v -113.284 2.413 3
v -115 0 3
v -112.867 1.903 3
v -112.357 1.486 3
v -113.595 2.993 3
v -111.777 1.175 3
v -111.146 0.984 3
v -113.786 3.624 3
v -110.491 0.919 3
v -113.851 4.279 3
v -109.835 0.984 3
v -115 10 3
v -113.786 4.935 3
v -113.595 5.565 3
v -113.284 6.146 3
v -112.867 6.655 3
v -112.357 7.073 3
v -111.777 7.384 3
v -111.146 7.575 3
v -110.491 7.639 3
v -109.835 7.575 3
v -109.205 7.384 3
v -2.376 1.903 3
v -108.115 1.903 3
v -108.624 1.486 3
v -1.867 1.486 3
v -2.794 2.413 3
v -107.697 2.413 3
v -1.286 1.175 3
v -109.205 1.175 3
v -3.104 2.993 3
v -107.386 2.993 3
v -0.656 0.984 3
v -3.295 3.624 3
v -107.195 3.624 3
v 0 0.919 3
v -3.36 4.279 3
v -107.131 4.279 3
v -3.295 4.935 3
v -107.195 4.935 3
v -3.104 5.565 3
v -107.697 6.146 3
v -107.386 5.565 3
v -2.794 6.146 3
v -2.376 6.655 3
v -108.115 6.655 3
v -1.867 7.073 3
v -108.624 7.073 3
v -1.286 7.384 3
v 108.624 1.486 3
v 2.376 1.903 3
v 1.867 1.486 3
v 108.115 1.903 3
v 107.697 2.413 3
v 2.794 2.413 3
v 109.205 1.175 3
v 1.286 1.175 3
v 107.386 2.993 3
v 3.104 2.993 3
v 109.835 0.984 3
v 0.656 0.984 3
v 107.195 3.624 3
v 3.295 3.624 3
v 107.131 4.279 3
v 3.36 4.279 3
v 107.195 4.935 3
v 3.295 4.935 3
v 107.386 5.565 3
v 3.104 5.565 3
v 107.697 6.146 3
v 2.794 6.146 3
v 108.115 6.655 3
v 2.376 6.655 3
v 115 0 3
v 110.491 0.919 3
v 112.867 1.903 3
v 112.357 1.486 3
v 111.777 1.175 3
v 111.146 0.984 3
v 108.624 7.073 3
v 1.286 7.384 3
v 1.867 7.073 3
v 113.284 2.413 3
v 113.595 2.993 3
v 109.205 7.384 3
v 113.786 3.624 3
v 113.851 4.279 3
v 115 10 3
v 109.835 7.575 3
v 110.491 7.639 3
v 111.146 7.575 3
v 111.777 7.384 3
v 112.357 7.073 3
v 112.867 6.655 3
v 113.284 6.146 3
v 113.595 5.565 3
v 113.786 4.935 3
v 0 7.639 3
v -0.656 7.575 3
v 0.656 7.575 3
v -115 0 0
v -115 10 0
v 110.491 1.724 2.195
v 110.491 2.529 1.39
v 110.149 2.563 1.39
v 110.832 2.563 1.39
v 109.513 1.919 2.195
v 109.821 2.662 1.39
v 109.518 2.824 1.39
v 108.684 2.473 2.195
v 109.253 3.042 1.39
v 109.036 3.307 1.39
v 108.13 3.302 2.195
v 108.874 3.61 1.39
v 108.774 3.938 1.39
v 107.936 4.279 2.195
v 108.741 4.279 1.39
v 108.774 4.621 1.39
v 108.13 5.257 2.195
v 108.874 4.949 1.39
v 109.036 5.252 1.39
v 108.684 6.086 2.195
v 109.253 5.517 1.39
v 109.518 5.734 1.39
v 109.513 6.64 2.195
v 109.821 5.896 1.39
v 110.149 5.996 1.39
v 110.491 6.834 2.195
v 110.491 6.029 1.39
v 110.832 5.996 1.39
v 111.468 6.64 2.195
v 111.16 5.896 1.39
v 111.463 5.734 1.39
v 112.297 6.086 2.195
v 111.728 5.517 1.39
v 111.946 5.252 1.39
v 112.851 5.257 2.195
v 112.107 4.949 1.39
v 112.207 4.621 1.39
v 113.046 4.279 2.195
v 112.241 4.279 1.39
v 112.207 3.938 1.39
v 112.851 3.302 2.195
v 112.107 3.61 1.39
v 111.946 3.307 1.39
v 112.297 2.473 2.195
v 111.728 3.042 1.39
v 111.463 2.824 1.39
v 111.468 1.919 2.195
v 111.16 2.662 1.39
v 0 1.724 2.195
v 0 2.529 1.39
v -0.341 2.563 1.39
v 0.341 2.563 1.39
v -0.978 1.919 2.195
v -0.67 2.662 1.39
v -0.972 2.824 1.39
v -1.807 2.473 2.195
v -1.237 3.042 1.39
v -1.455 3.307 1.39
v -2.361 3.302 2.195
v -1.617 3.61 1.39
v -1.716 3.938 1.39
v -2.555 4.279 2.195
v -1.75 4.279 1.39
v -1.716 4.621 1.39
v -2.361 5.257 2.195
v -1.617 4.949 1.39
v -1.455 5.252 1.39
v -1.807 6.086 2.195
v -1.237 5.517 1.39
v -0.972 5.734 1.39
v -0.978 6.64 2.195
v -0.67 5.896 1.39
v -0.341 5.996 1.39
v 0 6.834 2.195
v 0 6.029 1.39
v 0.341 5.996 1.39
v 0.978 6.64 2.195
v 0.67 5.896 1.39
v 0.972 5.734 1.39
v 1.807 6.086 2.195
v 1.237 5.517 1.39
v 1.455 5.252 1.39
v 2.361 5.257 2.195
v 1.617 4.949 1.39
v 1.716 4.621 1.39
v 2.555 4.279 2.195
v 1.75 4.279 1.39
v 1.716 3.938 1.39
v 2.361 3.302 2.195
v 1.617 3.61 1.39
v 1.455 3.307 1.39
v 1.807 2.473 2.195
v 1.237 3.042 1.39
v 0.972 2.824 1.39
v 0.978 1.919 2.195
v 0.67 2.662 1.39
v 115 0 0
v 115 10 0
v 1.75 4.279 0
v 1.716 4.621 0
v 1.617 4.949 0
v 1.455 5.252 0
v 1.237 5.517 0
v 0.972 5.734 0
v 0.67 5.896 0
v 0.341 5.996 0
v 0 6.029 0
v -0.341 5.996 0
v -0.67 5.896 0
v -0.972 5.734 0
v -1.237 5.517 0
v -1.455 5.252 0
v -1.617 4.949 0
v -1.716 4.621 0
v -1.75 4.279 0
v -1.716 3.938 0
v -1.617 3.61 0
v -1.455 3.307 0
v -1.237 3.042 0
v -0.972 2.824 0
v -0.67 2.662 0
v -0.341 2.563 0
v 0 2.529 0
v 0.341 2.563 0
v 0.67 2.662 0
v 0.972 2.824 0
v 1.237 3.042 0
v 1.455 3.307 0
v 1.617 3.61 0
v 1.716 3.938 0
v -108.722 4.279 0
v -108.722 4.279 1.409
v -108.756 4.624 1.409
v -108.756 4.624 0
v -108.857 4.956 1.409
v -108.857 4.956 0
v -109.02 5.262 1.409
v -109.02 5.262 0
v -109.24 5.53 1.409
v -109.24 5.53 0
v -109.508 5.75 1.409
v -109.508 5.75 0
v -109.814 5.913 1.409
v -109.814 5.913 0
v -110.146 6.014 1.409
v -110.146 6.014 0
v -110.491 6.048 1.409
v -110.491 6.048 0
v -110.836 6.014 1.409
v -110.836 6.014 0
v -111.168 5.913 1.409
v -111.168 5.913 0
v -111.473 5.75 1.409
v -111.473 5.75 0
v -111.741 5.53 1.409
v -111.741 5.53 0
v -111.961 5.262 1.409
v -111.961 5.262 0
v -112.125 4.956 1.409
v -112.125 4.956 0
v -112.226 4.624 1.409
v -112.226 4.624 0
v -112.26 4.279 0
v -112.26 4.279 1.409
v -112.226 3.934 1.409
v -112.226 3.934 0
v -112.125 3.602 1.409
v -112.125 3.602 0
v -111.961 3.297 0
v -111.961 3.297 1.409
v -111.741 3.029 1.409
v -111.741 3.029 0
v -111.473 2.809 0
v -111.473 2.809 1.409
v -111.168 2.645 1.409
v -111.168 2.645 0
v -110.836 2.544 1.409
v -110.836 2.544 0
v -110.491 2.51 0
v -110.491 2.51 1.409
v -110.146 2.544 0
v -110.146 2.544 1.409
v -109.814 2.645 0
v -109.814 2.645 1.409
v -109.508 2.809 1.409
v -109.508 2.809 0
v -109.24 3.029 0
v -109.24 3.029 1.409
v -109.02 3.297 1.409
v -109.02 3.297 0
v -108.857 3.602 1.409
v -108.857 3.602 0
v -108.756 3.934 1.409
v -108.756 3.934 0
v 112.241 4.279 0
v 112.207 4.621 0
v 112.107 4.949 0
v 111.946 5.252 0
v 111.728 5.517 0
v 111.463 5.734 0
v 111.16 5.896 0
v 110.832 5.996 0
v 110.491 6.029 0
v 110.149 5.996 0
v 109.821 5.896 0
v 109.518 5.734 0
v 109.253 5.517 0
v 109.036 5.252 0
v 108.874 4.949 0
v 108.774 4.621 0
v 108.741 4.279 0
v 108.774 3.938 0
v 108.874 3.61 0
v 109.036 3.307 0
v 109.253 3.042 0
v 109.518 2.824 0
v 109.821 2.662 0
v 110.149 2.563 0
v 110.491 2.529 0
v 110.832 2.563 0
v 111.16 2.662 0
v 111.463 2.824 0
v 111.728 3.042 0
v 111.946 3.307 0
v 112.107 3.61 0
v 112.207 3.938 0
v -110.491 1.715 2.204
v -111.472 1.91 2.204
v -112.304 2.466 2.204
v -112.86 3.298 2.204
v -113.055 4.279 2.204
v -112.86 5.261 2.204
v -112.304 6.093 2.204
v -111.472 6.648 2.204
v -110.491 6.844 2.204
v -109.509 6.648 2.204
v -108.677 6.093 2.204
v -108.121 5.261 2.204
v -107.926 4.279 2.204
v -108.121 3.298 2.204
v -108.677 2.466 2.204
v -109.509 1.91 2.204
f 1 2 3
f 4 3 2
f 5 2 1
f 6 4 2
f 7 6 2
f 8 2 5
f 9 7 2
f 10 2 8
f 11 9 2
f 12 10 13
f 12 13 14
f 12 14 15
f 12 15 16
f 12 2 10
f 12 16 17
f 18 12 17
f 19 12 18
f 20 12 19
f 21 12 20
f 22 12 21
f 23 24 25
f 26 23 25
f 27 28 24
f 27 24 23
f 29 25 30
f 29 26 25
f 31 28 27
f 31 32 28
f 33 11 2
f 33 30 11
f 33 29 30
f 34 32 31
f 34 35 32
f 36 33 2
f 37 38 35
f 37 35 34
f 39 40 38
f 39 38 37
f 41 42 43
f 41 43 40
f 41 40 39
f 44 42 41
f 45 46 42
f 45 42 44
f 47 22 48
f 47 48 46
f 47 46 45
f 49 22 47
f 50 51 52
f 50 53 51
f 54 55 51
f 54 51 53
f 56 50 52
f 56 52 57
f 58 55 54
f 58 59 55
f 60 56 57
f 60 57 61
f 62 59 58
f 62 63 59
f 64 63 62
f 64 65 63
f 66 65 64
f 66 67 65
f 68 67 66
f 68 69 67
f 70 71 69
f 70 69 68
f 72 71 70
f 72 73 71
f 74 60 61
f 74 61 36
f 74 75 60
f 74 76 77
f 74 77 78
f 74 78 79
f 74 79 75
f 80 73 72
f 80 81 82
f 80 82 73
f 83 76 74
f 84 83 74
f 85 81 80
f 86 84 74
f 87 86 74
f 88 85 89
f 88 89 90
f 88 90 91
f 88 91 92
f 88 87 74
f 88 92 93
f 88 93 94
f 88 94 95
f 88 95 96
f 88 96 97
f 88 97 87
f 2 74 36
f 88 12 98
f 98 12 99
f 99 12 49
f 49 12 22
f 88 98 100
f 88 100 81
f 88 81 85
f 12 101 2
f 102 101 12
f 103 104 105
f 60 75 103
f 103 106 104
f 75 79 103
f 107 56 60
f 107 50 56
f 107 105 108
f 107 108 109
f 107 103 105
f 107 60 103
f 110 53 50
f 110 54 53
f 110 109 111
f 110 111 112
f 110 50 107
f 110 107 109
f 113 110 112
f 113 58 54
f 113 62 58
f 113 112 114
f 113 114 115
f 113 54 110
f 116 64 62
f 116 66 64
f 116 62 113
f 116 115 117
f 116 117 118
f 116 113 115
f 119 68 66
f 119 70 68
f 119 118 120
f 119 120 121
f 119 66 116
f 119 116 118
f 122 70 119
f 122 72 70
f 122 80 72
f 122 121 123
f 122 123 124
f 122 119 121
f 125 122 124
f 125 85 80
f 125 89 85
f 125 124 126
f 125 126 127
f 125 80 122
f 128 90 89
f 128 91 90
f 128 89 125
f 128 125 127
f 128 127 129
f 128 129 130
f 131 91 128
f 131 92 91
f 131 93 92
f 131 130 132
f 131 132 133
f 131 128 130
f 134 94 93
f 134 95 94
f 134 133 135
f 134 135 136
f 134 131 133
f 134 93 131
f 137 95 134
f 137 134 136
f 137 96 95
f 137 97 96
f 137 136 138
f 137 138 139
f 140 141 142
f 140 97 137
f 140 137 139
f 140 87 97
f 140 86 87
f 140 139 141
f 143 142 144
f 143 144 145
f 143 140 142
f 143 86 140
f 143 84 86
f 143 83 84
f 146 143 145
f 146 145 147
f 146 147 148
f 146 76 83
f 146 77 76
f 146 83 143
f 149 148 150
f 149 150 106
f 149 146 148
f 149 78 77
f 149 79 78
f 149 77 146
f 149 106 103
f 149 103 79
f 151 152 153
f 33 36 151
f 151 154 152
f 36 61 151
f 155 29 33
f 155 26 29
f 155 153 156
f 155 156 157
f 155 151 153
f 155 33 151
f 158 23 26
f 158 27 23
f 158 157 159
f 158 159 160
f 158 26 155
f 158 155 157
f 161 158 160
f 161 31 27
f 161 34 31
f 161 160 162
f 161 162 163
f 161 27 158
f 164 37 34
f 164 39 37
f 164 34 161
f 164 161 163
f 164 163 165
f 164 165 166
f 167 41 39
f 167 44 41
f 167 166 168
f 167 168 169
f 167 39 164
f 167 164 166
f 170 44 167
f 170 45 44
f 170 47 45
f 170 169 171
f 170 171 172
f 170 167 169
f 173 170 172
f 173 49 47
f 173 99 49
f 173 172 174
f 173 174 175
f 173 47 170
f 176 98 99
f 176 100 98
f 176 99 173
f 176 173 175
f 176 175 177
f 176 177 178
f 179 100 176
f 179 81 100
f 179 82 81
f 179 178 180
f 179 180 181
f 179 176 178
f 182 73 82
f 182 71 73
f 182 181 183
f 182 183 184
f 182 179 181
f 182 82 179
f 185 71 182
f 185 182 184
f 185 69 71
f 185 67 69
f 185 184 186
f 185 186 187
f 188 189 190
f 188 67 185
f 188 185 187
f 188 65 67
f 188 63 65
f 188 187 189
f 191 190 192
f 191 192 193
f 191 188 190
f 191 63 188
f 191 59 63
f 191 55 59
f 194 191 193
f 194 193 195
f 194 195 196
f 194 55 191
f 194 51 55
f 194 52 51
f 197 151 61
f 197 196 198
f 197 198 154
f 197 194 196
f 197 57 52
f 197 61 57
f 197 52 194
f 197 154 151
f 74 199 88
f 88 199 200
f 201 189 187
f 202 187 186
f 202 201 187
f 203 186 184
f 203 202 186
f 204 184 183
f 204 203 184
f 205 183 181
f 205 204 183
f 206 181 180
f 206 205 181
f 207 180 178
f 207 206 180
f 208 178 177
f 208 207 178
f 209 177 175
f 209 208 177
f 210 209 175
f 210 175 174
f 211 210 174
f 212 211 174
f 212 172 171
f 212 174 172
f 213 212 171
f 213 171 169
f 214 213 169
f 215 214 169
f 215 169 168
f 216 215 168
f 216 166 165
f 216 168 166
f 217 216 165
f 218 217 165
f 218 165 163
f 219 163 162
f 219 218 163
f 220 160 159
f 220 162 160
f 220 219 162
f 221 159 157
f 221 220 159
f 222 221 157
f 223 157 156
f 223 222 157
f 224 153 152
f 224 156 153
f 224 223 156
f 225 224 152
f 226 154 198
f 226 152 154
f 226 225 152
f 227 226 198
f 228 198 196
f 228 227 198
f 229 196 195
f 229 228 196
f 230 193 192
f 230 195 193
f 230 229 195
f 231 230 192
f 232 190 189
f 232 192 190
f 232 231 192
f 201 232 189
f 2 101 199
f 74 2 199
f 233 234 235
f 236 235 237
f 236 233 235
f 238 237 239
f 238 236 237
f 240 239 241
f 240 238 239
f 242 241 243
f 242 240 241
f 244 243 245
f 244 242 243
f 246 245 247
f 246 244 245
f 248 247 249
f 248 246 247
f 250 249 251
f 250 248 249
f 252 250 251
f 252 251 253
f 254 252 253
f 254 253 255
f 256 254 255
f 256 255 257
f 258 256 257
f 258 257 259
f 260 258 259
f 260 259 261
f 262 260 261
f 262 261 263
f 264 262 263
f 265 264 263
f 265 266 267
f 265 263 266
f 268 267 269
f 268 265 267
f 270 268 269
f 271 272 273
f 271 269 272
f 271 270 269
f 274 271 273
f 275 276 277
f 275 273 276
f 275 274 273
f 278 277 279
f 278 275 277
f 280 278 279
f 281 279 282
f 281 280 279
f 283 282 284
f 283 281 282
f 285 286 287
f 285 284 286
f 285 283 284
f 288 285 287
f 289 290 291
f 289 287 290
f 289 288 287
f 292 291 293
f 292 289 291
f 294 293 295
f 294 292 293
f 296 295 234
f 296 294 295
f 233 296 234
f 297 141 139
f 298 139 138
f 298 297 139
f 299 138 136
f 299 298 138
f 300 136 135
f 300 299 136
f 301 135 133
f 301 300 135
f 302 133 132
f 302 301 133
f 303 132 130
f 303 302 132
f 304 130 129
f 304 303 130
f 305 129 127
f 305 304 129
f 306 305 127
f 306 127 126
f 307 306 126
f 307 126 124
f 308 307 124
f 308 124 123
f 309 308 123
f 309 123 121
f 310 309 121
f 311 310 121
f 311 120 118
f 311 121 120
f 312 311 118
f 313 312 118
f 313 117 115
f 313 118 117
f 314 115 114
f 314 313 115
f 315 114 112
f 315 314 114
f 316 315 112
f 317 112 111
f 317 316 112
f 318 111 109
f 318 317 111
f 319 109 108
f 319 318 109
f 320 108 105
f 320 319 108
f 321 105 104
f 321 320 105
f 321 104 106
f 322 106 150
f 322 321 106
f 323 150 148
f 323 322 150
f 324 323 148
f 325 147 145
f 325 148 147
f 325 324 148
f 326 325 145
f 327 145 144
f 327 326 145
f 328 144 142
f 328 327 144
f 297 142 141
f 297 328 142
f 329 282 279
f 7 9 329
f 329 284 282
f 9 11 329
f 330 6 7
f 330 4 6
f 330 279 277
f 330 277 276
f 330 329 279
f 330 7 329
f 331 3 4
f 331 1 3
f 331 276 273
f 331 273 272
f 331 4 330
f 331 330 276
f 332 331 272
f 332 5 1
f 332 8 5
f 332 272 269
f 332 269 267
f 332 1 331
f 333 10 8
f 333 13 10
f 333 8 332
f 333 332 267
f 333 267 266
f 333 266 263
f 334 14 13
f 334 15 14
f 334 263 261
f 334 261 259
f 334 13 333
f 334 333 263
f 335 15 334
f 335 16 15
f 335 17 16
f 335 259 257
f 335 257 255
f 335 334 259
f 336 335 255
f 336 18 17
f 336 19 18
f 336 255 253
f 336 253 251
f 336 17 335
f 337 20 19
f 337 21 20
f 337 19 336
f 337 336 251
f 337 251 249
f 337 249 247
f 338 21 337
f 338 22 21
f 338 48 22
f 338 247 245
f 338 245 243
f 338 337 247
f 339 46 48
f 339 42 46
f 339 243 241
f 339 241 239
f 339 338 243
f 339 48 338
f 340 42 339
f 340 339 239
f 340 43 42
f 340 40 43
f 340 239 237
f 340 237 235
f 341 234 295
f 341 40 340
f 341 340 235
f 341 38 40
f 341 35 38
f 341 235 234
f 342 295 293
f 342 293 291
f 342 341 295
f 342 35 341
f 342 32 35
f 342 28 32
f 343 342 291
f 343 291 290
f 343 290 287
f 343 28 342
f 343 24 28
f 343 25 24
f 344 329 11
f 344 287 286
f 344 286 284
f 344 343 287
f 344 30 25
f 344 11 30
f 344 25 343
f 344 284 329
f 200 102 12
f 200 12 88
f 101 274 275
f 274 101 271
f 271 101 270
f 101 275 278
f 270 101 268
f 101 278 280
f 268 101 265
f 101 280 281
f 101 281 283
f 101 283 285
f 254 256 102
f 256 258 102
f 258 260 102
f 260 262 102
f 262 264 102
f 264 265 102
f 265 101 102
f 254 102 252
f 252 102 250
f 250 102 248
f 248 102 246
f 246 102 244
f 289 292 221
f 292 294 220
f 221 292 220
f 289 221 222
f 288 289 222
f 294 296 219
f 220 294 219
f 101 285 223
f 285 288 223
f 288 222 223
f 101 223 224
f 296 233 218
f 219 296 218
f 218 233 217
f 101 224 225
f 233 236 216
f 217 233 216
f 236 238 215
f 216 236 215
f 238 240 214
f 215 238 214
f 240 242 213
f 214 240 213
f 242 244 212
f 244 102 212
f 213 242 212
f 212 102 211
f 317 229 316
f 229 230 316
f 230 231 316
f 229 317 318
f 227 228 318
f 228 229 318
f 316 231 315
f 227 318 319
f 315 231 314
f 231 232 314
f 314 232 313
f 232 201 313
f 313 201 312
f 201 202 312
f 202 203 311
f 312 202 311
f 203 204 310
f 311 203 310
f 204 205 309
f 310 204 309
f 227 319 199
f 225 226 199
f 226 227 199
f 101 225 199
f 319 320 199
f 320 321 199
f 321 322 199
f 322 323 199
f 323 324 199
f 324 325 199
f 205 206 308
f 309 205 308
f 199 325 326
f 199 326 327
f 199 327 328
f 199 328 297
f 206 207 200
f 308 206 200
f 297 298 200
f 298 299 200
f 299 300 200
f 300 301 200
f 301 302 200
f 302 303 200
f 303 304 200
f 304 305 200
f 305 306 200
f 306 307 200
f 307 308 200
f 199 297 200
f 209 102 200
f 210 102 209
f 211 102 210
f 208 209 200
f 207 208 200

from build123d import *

# Parameters (mm, degrees)
CROQUIS1_W                                   = 230
CROQUIS1_H                                   = 10
CROQUIS1_R                                   = 1.75
CROQUIS1_R_2                                 = 1.768842751
SALIENTE_EXTRUIR1_DEPTH                      = 3
REFRENTADO_PARA_TORNILLO_TAP_N_CON_C_2_COUNT = 2
REFRENTADO_PARA_TORNILLO_TAP_N_CON_C_2_PITCH = 110.490700251
REFRENTADO_PARA_TORNILLO_TAP_N_CON_C_3_COUNT = 2
REFRENTADO_PARA_TORNILLO_TAP_N_CON_C_3_PITCH = 220.981400502


with BuildPart() as part:
    # Croquis1 → Saliente-Extruir1 (new body)
    with BuildSketch(Plane.XY):
        with Locations((0, 5)):
            Rectangle(CROQUIS1_W, CROQUIS1_H)
        with Locations((0, 4.279276807)):
            Circle(CROQUIS1_R, mode=Mode.SUBTRACT)
        with Locations((-110.490700251, 4.279276807)):
            Circle(CROQUIS1_R_2, mode=Mode.SUBTRACT)
        with Locations((110.490700251, 4.279276807)):
            Circle(CROQUIS1_R, mode=Mode.SUBTRACT)
    extrude(amount=SALIENTE_EXTRUIR1_DEPTH)

    # Croquis3 → Refrentado para tornillo tapón con cabeza plana de clavija de M31 (revolve, cut)
    with BuildSketch(Plane(origin=(-110.490700251, 4.279276807, 3), x_dir=(0, -1, 0), z_dir=(1, 0, 0))):
        Polygon((0, 0), (0, 3), (1.7, 3), (1.7, 1.66), (3.36, 0), align=None)
    refrentado_para_tornillo_tap_n_con_cabez = revolve(axis=Axis((-110.490700251, 4.279276807, 9.35), (0, 0, -1)), mode=Mode.SUBTRACT)

    # Refrentado para tornillo tap_n con c 2: Refrentado para tornillo tapón con cabeza plana de clavija de M31 ×2
    with Locations(*[(i * REFRENTADO_PARA_TORNILLO_TAP_N_CON_C_2_PITCH, 0, 0) for i in range(1, REFRENTADO_PARA_TORNILLO_TAP_N_CON_C_2_COUNT)]):
        add(refrentado_para_tornillo_tap_n_con_cabez, mode=Mode.SUBTRACT)

    # Refrentado para tornillo tap_n con c 3: Refrentado para tornillo tapón con cabeza plana de clavija de M31 ×2
    with Locations(*[(i * REFRENTADO_PARA_TORNILLO_TAP_N_CON_C_3_PITCH, 0, 0) for i in range(1, REFRENTADO_PARA_TORNILLO_TAP_N_CON_C_3_COUNT)]):
        add(refrentado_para_tornillo_tap_n_con_cabez, mode=Mode.SUBTRACT)


solid = part.part
